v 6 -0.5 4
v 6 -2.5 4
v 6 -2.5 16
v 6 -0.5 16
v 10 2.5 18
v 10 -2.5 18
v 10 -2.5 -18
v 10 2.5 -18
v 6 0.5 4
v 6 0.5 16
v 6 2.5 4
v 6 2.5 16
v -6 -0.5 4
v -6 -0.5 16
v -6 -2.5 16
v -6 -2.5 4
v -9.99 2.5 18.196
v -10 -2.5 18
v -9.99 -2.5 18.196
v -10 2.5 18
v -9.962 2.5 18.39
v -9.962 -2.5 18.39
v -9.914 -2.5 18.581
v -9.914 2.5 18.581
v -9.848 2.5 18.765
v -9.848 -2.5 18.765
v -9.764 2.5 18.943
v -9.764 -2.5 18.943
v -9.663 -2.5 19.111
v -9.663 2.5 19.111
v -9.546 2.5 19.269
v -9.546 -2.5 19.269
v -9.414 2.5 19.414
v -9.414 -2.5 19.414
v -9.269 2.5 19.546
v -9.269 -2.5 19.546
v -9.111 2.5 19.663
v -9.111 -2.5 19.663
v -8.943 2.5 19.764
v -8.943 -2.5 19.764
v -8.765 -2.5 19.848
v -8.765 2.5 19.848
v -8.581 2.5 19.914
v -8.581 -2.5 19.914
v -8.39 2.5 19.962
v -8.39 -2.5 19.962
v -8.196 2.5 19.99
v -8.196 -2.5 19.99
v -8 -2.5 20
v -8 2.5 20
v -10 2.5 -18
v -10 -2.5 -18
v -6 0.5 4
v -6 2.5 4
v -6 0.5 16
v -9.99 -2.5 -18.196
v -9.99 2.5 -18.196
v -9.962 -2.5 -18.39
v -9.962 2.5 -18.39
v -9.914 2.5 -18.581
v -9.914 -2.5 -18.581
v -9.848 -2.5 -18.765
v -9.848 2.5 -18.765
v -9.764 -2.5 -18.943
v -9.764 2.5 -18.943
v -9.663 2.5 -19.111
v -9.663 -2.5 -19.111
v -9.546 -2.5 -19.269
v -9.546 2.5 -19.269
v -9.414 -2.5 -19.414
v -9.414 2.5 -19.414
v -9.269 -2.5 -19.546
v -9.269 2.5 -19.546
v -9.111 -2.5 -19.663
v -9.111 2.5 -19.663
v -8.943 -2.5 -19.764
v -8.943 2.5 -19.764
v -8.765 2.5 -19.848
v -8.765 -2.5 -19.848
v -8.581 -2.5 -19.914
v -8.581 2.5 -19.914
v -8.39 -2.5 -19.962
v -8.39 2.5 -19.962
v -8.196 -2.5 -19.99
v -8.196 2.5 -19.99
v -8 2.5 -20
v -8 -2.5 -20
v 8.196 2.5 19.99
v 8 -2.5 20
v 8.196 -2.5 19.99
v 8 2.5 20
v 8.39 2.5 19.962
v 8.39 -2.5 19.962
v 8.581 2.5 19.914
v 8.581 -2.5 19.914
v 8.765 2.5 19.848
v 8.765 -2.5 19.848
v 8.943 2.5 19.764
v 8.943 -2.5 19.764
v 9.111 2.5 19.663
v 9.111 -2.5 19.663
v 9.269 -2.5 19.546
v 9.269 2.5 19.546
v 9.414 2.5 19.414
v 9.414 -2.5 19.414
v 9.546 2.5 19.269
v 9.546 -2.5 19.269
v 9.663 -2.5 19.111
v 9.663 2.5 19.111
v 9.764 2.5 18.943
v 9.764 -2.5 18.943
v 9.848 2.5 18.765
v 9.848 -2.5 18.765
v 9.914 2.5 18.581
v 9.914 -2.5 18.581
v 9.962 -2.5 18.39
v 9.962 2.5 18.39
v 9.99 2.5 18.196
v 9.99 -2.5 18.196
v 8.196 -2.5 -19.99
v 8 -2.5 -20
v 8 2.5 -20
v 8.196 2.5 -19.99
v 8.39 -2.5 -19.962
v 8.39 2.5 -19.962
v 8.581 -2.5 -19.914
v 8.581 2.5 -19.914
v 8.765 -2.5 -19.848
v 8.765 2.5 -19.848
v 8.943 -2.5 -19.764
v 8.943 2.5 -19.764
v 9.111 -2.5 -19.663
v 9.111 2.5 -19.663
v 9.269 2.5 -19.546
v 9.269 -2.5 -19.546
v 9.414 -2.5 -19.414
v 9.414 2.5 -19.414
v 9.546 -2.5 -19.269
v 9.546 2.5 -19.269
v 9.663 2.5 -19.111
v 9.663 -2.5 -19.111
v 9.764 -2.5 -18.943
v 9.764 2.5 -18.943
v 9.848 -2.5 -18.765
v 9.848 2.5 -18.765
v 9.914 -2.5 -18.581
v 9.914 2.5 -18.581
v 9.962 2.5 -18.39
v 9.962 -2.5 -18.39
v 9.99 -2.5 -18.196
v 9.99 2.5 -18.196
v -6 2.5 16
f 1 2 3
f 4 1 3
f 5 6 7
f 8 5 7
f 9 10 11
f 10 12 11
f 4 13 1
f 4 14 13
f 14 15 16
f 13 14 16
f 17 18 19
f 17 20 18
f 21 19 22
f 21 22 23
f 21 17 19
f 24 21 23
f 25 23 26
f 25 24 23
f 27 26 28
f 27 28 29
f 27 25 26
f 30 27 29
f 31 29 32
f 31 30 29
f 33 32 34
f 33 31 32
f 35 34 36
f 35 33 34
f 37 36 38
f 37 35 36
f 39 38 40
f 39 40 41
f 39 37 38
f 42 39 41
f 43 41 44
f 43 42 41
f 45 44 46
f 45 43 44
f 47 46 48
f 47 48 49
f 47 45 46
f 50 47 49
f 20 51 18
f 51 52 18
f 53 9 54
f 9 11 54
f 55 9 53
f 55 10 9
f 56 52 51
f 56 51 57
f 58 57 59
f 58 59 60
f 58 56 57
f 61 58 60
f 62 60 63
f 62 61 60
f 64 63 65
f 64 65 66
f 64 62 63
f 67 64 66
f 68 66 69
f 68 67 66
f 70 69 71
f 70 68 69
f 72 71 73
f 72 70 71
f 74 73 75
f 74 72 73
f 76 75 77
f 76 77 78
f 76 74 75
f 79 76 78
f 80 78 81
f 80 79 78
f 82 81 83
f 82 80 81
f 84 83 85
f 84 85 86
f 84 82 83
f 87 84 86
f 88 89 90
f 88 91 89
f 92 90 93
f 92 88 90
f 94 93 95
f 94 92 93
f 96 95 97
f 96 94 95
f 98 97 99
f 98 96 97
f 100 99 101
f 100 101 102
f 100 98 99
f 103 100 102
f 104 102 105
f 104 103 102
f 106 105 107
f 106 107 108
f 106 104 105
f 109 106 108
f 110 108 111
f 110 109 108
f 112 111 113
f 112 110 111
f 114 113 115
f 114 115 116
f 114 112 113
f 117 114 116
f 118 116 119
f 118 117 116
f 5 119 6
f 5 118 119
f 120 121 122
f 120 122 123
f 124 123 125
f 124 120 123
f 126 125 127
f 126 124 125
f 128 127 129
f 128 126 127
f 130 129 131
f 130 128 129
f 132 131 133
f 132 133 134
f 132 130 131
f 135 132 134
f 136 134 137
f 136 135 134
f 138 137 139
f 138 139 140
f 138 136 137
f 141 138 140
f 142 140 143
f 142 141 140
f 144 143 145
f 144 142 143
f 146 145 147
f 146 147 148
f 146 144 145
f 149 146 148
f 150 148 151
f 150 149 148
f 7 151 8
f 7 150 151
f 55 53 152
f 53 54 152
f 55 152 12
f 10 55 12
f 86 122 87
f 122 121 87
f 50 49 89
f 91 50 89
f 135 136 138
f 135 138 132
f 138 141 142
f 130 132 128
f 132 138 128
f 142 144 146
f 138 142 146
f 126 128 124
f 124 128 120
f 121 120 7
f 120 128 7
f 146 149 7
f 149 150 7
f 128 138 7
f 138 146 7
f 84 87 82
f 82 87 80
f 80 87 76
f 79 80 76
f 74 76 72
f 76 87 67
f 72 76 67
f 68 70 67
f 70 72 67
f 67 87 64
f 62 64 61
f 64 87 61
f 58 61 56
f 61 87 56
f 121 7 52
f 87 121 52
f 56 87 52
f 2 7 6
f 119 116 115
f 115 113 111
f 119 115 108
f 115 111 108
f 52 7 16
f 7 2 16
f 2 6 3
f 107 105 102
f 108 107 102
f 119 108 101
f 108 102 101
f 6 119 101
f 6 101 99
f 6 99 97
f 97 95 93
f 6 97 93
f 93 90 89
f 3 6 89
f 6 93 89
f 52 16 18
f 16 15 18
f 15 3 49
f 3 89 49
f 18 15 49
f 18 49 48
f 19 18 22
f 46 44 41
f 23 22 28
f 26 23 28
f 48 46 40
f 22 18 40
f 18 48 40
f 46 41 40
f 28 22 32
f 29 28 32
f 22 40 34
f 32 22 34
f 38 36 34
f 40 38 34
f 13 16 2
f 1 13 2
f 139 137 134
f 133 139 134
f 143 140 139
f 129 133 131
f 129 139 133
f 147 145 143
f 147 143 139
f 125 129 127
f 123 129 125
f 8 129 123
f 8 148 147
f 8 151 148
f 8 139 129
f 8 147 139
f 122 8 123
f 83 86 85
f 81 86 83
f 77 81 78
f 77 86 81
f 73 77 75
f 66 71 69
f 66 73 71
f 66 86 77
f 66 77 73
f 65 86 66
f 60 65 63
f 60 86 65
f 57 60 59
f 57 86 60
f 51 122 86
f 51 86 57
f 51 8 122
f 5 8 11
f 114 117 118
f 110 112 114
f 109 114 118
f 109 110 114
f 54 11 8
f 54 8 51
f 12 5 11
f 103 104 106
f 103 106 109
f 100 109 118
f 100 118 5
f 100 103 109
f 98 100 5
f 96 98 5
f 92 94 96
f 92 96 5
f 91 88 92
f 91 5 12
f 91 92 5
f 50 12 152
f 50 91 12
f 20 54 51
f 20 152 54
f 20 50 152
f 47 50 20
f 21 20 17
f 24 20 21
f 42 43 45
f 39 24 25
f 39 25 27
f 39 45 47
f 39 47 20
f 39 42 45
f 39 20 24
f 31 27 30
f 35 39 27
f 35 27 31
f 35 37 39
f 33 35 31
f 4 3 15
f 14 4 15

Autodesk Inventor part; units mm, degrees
ref_plane "YZ Plane" through (0, 0, 0) normal (1, 0, 0) x (0, 1, 0)
ref_plane "XZ Plane" through (0, 0, 0) normal (0, 1, 0) x (-1, 0, 0)
ref_plane "XY Plane" through (0, 0, 0) normal (0, 0, 1) x (1, 0, 0)
sketch "草圖1" plane through (0, 0, 0) normal (0, 1, 0) x (-1, 0, 0)
  line L0 (10, 20) -> (-10, 20)
  line L1 (-10, 20) -> (-10, -20)
  line L2 (-10, -20) -> (10, -20)
  line L3 (10, -20) -> (10, 20)
  line L4 (10, 20) -> (-10, -20) construction
  line L5 (-10, 20) -> (10, -20) construction
  point P0 (0, 0)
  dimension "d0" = 20
  dimension "d1" = 40
extrude "擠出1" add sketch "草圖1" along normal mid plane 5
sketch "草圖2" plane through (0, -2.5, 0) normal (0, -1, 0) x (1, 0, 0)
  line L0 (-6, 4) -> (6, 4)
  line L1 (6, 4) -> (6, 16)
  line L2 (6, 16) -> (-6, 16)
  line L3 (-6, 16) -> (-6, 4)
  line L4 (-6, 4) -> (6, 16) construction
  line L5 (6, 4) -> (-6, 16) construction
  line L6 (10, 20) -> (-10, 20) projected
  point P0 (0, 0)
  point P1 (0, 10)
  point P2 (0, 10)
  dimension "d4" = 12
  dimension "d5" = 12
  dimension "d6" = 10
extrude "擠出2" cut sketch "草圖2" against normal blind 2
fillet "圓角1" radius 2 4 edges at (-10, 0, 20) (10, 0, 20) (10, 0, -20) (-10, 0, -20)
mirror "鏡射1" about plane through (0, 0, 0) normal (0, 1, 0) of "擠出2"
equation "\"d5\" = d4"
properties part number "維修門固定器"
